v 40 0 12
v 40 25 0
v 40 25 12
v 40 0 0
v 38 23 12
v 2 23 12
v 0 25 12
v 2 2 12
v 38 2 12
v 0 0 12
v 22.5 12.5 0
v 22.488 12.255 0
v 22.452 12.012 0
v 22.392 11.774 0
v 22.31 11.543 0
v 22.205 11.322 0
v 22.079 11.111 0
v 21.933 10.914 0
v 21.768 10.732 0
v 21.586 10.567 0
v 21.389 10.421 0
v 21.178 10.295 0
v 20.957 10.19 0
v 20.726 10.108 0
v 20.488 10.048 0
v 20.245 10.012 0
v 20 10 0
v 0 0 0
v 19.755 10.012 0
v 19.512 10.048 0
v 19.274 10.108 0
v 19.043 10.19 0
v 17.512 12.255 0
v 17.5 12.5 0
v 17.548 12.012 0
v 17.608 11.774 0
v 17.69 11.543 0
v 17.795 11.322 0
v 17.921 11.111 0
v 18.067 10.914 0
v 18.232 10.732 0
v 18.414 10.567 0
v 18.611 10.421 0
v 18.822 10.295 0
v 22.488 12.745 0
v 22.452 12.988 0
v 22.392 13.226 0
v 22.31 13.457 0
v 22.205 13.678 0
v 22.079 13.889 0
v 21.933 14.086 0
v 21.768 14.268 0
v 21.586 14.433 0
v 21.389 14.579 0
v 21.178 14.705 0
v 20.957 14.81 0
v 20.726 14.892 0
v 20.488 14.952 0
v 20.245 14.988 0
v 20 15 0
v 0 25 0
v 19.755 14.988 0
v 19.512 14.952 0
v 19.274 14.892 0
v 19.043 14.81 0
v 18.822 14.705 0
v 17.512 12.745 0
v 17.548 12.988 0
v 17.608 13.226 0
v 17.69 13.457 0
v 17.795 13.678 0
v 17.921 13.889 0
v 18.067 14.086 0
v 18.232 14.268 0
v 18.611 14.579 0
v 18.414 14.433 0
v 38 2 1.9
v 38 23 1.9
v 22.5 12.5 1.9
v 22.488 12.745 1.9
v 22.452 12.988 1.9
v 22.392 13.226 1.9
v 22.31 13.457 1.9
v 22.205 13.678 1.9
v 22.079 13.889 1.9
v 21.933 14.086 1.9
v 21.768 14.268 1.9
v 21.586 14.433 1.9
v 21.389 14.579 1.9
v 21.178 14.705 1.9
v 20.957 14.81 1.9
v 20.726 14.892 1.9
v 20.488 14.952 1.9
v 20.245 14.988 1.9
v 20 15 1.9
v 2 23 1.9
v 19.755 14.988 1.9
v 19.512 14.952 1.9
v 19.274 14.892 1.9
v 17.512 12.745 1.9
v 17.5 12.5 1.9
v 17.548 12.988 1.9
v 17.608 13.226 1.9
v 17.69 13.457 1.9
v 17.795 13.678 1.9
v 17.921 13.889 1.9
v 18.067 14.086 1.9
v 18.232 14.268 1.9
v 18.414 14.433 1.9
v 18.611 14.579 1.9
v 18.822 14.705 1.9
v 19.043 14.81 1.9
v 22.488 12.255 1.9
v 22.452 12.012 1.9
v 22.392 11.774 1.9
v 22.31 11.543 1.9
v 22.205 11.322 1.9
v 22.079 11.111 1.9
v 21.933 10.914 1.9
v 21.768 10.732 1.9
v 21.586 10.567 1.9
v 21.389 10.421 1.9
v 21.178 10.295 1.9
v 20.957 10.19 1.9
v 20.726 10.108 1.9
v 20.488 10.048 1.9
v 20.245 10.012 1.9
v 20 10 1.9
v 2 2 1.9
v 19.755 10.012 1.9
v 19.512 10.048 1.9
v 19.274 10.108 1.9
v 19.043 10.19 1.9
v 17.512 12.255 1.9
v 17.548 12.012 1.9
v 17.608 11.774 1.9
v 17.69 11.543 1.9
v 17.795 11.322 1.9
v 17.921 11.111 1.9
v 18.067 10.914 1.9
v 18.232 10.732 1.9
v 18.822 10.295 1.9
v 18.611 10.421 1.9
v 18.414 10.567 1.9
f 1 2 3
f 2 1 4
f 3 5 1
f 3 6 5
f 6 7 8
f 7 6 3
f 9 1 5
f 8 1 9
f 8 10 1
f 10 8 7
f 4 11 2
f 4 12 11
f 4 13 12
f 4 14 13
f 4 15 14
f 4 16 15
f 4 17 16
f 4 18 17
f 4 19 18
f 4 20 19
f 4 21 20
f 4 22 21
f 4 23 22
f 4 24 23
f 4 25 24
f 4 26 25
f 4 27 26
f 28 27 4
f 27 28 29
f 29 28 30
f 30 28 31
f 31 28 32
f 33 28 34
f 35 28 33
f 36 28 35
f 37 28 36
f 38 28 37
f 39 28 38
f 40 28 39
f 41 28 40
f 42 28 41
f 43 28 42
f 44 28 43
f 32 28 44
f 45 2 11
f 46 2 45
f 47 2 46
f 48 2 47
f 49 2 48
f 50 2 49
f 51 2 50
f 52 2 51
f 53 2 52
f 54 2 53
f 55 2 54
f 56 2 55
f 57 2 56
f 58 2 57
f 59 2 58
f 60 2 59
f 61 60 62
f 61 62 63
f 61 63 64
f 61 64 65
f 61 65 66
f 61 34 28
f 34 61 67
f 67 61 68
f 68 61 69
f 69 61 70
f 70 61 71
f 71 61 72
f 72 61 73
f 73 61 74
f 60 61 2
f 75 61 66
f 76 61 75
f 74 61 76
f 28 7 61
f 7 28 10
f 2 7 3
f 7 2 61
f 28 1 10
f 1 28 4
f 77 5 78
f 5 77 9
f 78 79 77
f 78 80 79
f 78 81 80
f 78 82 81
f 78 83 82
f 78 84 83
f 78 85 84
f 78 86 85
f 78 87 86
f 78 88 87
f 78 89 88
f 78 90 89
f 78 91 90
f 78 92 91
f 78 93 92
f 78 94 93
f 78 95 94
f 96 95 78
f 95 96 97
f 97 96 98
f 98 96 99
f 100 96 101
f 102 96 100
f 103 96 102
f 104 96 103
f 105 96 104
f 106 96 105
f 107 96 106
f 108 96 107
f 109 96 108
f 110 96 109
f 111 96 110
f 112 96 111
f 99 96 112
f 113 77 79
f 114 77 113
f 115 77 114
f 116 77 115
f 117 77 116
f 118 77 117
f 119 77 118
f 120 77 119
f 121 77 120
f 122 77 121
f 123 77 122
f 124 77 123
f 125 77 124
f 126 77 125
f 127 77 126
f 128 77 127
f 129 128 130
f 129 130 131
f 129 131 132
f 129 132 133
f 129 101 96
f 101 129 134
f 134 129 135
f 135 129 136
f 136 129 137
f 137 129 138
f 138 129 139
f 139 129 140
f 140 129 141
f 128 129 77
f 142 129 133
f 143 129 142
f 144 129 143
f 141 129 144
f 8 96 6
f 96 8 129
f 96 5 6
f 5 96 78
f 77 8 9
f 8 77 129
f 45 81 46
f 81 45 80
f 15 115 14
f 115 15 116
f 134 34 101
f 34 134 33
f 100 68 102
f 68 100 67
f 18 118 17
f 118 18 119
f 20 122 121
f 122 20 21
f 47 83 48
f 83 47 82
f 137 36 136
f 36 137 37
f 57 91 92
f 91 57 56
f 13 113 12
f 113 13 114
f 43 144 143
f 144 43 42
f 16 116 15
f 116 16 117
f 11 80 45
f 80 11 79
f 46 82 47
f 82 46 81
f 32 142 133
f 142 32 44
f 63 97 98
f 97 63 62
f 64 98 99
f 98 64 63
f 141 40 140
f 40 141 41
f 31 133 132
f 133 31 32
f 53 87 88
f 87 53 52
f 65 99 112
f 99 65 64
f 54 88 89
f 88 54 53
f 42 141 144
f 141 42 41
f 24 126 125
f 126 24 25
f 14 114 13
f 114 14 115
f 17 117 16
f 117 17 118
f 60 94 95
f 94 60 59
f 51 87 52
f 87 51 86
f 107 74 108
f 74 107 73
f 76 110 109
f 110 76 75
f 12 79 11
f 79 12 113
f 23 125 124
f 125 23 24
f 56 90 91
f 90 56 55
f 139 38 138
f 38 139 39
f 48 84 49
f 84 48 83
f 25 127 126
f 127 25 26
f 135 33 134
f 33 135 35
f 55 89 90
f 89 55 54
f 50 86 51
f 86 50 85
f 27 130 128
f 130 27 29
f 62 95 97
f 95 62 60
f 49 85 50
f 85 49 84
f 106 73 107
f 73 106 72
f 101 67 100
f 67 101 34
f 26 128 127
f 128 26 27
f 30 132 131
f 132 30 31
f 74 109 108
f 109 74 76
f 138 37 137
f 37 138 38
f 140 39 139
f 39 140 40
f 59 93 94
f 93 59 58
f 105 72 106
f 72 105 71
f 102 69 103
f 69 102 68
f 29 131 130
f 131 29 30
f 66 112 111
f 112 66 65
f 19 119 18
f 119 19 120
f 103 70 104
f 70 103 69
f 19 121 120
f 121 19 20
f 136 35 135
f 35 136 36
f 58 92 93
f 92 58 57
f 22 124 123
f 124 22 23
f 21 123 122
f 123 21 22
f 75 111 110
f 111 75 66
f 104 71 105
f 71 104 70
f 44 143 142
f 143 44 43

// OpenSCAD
// parametric-part.scad — starter for sketch+dimensions → printable STL
// OpenSCAD units are MILLIMETERS. Keep every dimension a named variable.
// NOTE: a naive bottom-edge chamfer via minkowski() BLOATS the footprint by
// the chamfer radius — for dimensional honesty, leave the box true to size
// and let the slicer's elephant-foot compensation / first-layer settings
// handle layer-1 squish instead.

$fn = 64;

// ==== Dimensions (edit these; João's spec table lives in the chat) ====
width  = 40;   // X overall
length = 25;   // Y overall
height = 12;   // Z overall
wall   = 2.0;  // shell thickness (>= 0.8 for 0.4mm nozzle)
hole_d = 5.0;  // through-hole diameter

// ==== Printability pre-flight ====
assert(width  >= 1.6 && length >= 1.6 && height >= 0.8, "part below min feature size");
assert(width <= 210 && length <= 210 && height <= 210, "part exceeds AD5X usable bed 210mm");
assert(wall >= 0.8, "wall thinner than 2 perimeters (0.8mm) will not print cleanly");

// ==== Features ====
module shell() {
    difference() {
        cube([width, length, height], center = false);
        translate([wall, wall, wall - 0.1])          // -0.1 avoids shared-face sliver
            cube([width - 2*wall, length - 2*wall, height - wall + 0.1]);
    }
}

module hole() {
    // through-hole centered in X, offset toward front in Y
    translate([width / 2, wall + (length - 2*wall) / 2, -0.5])
        cylinder(h = height + 1, d = hole_d);
}

// ==== Assembly ====
difference() {
    shell();
    hole();
}
